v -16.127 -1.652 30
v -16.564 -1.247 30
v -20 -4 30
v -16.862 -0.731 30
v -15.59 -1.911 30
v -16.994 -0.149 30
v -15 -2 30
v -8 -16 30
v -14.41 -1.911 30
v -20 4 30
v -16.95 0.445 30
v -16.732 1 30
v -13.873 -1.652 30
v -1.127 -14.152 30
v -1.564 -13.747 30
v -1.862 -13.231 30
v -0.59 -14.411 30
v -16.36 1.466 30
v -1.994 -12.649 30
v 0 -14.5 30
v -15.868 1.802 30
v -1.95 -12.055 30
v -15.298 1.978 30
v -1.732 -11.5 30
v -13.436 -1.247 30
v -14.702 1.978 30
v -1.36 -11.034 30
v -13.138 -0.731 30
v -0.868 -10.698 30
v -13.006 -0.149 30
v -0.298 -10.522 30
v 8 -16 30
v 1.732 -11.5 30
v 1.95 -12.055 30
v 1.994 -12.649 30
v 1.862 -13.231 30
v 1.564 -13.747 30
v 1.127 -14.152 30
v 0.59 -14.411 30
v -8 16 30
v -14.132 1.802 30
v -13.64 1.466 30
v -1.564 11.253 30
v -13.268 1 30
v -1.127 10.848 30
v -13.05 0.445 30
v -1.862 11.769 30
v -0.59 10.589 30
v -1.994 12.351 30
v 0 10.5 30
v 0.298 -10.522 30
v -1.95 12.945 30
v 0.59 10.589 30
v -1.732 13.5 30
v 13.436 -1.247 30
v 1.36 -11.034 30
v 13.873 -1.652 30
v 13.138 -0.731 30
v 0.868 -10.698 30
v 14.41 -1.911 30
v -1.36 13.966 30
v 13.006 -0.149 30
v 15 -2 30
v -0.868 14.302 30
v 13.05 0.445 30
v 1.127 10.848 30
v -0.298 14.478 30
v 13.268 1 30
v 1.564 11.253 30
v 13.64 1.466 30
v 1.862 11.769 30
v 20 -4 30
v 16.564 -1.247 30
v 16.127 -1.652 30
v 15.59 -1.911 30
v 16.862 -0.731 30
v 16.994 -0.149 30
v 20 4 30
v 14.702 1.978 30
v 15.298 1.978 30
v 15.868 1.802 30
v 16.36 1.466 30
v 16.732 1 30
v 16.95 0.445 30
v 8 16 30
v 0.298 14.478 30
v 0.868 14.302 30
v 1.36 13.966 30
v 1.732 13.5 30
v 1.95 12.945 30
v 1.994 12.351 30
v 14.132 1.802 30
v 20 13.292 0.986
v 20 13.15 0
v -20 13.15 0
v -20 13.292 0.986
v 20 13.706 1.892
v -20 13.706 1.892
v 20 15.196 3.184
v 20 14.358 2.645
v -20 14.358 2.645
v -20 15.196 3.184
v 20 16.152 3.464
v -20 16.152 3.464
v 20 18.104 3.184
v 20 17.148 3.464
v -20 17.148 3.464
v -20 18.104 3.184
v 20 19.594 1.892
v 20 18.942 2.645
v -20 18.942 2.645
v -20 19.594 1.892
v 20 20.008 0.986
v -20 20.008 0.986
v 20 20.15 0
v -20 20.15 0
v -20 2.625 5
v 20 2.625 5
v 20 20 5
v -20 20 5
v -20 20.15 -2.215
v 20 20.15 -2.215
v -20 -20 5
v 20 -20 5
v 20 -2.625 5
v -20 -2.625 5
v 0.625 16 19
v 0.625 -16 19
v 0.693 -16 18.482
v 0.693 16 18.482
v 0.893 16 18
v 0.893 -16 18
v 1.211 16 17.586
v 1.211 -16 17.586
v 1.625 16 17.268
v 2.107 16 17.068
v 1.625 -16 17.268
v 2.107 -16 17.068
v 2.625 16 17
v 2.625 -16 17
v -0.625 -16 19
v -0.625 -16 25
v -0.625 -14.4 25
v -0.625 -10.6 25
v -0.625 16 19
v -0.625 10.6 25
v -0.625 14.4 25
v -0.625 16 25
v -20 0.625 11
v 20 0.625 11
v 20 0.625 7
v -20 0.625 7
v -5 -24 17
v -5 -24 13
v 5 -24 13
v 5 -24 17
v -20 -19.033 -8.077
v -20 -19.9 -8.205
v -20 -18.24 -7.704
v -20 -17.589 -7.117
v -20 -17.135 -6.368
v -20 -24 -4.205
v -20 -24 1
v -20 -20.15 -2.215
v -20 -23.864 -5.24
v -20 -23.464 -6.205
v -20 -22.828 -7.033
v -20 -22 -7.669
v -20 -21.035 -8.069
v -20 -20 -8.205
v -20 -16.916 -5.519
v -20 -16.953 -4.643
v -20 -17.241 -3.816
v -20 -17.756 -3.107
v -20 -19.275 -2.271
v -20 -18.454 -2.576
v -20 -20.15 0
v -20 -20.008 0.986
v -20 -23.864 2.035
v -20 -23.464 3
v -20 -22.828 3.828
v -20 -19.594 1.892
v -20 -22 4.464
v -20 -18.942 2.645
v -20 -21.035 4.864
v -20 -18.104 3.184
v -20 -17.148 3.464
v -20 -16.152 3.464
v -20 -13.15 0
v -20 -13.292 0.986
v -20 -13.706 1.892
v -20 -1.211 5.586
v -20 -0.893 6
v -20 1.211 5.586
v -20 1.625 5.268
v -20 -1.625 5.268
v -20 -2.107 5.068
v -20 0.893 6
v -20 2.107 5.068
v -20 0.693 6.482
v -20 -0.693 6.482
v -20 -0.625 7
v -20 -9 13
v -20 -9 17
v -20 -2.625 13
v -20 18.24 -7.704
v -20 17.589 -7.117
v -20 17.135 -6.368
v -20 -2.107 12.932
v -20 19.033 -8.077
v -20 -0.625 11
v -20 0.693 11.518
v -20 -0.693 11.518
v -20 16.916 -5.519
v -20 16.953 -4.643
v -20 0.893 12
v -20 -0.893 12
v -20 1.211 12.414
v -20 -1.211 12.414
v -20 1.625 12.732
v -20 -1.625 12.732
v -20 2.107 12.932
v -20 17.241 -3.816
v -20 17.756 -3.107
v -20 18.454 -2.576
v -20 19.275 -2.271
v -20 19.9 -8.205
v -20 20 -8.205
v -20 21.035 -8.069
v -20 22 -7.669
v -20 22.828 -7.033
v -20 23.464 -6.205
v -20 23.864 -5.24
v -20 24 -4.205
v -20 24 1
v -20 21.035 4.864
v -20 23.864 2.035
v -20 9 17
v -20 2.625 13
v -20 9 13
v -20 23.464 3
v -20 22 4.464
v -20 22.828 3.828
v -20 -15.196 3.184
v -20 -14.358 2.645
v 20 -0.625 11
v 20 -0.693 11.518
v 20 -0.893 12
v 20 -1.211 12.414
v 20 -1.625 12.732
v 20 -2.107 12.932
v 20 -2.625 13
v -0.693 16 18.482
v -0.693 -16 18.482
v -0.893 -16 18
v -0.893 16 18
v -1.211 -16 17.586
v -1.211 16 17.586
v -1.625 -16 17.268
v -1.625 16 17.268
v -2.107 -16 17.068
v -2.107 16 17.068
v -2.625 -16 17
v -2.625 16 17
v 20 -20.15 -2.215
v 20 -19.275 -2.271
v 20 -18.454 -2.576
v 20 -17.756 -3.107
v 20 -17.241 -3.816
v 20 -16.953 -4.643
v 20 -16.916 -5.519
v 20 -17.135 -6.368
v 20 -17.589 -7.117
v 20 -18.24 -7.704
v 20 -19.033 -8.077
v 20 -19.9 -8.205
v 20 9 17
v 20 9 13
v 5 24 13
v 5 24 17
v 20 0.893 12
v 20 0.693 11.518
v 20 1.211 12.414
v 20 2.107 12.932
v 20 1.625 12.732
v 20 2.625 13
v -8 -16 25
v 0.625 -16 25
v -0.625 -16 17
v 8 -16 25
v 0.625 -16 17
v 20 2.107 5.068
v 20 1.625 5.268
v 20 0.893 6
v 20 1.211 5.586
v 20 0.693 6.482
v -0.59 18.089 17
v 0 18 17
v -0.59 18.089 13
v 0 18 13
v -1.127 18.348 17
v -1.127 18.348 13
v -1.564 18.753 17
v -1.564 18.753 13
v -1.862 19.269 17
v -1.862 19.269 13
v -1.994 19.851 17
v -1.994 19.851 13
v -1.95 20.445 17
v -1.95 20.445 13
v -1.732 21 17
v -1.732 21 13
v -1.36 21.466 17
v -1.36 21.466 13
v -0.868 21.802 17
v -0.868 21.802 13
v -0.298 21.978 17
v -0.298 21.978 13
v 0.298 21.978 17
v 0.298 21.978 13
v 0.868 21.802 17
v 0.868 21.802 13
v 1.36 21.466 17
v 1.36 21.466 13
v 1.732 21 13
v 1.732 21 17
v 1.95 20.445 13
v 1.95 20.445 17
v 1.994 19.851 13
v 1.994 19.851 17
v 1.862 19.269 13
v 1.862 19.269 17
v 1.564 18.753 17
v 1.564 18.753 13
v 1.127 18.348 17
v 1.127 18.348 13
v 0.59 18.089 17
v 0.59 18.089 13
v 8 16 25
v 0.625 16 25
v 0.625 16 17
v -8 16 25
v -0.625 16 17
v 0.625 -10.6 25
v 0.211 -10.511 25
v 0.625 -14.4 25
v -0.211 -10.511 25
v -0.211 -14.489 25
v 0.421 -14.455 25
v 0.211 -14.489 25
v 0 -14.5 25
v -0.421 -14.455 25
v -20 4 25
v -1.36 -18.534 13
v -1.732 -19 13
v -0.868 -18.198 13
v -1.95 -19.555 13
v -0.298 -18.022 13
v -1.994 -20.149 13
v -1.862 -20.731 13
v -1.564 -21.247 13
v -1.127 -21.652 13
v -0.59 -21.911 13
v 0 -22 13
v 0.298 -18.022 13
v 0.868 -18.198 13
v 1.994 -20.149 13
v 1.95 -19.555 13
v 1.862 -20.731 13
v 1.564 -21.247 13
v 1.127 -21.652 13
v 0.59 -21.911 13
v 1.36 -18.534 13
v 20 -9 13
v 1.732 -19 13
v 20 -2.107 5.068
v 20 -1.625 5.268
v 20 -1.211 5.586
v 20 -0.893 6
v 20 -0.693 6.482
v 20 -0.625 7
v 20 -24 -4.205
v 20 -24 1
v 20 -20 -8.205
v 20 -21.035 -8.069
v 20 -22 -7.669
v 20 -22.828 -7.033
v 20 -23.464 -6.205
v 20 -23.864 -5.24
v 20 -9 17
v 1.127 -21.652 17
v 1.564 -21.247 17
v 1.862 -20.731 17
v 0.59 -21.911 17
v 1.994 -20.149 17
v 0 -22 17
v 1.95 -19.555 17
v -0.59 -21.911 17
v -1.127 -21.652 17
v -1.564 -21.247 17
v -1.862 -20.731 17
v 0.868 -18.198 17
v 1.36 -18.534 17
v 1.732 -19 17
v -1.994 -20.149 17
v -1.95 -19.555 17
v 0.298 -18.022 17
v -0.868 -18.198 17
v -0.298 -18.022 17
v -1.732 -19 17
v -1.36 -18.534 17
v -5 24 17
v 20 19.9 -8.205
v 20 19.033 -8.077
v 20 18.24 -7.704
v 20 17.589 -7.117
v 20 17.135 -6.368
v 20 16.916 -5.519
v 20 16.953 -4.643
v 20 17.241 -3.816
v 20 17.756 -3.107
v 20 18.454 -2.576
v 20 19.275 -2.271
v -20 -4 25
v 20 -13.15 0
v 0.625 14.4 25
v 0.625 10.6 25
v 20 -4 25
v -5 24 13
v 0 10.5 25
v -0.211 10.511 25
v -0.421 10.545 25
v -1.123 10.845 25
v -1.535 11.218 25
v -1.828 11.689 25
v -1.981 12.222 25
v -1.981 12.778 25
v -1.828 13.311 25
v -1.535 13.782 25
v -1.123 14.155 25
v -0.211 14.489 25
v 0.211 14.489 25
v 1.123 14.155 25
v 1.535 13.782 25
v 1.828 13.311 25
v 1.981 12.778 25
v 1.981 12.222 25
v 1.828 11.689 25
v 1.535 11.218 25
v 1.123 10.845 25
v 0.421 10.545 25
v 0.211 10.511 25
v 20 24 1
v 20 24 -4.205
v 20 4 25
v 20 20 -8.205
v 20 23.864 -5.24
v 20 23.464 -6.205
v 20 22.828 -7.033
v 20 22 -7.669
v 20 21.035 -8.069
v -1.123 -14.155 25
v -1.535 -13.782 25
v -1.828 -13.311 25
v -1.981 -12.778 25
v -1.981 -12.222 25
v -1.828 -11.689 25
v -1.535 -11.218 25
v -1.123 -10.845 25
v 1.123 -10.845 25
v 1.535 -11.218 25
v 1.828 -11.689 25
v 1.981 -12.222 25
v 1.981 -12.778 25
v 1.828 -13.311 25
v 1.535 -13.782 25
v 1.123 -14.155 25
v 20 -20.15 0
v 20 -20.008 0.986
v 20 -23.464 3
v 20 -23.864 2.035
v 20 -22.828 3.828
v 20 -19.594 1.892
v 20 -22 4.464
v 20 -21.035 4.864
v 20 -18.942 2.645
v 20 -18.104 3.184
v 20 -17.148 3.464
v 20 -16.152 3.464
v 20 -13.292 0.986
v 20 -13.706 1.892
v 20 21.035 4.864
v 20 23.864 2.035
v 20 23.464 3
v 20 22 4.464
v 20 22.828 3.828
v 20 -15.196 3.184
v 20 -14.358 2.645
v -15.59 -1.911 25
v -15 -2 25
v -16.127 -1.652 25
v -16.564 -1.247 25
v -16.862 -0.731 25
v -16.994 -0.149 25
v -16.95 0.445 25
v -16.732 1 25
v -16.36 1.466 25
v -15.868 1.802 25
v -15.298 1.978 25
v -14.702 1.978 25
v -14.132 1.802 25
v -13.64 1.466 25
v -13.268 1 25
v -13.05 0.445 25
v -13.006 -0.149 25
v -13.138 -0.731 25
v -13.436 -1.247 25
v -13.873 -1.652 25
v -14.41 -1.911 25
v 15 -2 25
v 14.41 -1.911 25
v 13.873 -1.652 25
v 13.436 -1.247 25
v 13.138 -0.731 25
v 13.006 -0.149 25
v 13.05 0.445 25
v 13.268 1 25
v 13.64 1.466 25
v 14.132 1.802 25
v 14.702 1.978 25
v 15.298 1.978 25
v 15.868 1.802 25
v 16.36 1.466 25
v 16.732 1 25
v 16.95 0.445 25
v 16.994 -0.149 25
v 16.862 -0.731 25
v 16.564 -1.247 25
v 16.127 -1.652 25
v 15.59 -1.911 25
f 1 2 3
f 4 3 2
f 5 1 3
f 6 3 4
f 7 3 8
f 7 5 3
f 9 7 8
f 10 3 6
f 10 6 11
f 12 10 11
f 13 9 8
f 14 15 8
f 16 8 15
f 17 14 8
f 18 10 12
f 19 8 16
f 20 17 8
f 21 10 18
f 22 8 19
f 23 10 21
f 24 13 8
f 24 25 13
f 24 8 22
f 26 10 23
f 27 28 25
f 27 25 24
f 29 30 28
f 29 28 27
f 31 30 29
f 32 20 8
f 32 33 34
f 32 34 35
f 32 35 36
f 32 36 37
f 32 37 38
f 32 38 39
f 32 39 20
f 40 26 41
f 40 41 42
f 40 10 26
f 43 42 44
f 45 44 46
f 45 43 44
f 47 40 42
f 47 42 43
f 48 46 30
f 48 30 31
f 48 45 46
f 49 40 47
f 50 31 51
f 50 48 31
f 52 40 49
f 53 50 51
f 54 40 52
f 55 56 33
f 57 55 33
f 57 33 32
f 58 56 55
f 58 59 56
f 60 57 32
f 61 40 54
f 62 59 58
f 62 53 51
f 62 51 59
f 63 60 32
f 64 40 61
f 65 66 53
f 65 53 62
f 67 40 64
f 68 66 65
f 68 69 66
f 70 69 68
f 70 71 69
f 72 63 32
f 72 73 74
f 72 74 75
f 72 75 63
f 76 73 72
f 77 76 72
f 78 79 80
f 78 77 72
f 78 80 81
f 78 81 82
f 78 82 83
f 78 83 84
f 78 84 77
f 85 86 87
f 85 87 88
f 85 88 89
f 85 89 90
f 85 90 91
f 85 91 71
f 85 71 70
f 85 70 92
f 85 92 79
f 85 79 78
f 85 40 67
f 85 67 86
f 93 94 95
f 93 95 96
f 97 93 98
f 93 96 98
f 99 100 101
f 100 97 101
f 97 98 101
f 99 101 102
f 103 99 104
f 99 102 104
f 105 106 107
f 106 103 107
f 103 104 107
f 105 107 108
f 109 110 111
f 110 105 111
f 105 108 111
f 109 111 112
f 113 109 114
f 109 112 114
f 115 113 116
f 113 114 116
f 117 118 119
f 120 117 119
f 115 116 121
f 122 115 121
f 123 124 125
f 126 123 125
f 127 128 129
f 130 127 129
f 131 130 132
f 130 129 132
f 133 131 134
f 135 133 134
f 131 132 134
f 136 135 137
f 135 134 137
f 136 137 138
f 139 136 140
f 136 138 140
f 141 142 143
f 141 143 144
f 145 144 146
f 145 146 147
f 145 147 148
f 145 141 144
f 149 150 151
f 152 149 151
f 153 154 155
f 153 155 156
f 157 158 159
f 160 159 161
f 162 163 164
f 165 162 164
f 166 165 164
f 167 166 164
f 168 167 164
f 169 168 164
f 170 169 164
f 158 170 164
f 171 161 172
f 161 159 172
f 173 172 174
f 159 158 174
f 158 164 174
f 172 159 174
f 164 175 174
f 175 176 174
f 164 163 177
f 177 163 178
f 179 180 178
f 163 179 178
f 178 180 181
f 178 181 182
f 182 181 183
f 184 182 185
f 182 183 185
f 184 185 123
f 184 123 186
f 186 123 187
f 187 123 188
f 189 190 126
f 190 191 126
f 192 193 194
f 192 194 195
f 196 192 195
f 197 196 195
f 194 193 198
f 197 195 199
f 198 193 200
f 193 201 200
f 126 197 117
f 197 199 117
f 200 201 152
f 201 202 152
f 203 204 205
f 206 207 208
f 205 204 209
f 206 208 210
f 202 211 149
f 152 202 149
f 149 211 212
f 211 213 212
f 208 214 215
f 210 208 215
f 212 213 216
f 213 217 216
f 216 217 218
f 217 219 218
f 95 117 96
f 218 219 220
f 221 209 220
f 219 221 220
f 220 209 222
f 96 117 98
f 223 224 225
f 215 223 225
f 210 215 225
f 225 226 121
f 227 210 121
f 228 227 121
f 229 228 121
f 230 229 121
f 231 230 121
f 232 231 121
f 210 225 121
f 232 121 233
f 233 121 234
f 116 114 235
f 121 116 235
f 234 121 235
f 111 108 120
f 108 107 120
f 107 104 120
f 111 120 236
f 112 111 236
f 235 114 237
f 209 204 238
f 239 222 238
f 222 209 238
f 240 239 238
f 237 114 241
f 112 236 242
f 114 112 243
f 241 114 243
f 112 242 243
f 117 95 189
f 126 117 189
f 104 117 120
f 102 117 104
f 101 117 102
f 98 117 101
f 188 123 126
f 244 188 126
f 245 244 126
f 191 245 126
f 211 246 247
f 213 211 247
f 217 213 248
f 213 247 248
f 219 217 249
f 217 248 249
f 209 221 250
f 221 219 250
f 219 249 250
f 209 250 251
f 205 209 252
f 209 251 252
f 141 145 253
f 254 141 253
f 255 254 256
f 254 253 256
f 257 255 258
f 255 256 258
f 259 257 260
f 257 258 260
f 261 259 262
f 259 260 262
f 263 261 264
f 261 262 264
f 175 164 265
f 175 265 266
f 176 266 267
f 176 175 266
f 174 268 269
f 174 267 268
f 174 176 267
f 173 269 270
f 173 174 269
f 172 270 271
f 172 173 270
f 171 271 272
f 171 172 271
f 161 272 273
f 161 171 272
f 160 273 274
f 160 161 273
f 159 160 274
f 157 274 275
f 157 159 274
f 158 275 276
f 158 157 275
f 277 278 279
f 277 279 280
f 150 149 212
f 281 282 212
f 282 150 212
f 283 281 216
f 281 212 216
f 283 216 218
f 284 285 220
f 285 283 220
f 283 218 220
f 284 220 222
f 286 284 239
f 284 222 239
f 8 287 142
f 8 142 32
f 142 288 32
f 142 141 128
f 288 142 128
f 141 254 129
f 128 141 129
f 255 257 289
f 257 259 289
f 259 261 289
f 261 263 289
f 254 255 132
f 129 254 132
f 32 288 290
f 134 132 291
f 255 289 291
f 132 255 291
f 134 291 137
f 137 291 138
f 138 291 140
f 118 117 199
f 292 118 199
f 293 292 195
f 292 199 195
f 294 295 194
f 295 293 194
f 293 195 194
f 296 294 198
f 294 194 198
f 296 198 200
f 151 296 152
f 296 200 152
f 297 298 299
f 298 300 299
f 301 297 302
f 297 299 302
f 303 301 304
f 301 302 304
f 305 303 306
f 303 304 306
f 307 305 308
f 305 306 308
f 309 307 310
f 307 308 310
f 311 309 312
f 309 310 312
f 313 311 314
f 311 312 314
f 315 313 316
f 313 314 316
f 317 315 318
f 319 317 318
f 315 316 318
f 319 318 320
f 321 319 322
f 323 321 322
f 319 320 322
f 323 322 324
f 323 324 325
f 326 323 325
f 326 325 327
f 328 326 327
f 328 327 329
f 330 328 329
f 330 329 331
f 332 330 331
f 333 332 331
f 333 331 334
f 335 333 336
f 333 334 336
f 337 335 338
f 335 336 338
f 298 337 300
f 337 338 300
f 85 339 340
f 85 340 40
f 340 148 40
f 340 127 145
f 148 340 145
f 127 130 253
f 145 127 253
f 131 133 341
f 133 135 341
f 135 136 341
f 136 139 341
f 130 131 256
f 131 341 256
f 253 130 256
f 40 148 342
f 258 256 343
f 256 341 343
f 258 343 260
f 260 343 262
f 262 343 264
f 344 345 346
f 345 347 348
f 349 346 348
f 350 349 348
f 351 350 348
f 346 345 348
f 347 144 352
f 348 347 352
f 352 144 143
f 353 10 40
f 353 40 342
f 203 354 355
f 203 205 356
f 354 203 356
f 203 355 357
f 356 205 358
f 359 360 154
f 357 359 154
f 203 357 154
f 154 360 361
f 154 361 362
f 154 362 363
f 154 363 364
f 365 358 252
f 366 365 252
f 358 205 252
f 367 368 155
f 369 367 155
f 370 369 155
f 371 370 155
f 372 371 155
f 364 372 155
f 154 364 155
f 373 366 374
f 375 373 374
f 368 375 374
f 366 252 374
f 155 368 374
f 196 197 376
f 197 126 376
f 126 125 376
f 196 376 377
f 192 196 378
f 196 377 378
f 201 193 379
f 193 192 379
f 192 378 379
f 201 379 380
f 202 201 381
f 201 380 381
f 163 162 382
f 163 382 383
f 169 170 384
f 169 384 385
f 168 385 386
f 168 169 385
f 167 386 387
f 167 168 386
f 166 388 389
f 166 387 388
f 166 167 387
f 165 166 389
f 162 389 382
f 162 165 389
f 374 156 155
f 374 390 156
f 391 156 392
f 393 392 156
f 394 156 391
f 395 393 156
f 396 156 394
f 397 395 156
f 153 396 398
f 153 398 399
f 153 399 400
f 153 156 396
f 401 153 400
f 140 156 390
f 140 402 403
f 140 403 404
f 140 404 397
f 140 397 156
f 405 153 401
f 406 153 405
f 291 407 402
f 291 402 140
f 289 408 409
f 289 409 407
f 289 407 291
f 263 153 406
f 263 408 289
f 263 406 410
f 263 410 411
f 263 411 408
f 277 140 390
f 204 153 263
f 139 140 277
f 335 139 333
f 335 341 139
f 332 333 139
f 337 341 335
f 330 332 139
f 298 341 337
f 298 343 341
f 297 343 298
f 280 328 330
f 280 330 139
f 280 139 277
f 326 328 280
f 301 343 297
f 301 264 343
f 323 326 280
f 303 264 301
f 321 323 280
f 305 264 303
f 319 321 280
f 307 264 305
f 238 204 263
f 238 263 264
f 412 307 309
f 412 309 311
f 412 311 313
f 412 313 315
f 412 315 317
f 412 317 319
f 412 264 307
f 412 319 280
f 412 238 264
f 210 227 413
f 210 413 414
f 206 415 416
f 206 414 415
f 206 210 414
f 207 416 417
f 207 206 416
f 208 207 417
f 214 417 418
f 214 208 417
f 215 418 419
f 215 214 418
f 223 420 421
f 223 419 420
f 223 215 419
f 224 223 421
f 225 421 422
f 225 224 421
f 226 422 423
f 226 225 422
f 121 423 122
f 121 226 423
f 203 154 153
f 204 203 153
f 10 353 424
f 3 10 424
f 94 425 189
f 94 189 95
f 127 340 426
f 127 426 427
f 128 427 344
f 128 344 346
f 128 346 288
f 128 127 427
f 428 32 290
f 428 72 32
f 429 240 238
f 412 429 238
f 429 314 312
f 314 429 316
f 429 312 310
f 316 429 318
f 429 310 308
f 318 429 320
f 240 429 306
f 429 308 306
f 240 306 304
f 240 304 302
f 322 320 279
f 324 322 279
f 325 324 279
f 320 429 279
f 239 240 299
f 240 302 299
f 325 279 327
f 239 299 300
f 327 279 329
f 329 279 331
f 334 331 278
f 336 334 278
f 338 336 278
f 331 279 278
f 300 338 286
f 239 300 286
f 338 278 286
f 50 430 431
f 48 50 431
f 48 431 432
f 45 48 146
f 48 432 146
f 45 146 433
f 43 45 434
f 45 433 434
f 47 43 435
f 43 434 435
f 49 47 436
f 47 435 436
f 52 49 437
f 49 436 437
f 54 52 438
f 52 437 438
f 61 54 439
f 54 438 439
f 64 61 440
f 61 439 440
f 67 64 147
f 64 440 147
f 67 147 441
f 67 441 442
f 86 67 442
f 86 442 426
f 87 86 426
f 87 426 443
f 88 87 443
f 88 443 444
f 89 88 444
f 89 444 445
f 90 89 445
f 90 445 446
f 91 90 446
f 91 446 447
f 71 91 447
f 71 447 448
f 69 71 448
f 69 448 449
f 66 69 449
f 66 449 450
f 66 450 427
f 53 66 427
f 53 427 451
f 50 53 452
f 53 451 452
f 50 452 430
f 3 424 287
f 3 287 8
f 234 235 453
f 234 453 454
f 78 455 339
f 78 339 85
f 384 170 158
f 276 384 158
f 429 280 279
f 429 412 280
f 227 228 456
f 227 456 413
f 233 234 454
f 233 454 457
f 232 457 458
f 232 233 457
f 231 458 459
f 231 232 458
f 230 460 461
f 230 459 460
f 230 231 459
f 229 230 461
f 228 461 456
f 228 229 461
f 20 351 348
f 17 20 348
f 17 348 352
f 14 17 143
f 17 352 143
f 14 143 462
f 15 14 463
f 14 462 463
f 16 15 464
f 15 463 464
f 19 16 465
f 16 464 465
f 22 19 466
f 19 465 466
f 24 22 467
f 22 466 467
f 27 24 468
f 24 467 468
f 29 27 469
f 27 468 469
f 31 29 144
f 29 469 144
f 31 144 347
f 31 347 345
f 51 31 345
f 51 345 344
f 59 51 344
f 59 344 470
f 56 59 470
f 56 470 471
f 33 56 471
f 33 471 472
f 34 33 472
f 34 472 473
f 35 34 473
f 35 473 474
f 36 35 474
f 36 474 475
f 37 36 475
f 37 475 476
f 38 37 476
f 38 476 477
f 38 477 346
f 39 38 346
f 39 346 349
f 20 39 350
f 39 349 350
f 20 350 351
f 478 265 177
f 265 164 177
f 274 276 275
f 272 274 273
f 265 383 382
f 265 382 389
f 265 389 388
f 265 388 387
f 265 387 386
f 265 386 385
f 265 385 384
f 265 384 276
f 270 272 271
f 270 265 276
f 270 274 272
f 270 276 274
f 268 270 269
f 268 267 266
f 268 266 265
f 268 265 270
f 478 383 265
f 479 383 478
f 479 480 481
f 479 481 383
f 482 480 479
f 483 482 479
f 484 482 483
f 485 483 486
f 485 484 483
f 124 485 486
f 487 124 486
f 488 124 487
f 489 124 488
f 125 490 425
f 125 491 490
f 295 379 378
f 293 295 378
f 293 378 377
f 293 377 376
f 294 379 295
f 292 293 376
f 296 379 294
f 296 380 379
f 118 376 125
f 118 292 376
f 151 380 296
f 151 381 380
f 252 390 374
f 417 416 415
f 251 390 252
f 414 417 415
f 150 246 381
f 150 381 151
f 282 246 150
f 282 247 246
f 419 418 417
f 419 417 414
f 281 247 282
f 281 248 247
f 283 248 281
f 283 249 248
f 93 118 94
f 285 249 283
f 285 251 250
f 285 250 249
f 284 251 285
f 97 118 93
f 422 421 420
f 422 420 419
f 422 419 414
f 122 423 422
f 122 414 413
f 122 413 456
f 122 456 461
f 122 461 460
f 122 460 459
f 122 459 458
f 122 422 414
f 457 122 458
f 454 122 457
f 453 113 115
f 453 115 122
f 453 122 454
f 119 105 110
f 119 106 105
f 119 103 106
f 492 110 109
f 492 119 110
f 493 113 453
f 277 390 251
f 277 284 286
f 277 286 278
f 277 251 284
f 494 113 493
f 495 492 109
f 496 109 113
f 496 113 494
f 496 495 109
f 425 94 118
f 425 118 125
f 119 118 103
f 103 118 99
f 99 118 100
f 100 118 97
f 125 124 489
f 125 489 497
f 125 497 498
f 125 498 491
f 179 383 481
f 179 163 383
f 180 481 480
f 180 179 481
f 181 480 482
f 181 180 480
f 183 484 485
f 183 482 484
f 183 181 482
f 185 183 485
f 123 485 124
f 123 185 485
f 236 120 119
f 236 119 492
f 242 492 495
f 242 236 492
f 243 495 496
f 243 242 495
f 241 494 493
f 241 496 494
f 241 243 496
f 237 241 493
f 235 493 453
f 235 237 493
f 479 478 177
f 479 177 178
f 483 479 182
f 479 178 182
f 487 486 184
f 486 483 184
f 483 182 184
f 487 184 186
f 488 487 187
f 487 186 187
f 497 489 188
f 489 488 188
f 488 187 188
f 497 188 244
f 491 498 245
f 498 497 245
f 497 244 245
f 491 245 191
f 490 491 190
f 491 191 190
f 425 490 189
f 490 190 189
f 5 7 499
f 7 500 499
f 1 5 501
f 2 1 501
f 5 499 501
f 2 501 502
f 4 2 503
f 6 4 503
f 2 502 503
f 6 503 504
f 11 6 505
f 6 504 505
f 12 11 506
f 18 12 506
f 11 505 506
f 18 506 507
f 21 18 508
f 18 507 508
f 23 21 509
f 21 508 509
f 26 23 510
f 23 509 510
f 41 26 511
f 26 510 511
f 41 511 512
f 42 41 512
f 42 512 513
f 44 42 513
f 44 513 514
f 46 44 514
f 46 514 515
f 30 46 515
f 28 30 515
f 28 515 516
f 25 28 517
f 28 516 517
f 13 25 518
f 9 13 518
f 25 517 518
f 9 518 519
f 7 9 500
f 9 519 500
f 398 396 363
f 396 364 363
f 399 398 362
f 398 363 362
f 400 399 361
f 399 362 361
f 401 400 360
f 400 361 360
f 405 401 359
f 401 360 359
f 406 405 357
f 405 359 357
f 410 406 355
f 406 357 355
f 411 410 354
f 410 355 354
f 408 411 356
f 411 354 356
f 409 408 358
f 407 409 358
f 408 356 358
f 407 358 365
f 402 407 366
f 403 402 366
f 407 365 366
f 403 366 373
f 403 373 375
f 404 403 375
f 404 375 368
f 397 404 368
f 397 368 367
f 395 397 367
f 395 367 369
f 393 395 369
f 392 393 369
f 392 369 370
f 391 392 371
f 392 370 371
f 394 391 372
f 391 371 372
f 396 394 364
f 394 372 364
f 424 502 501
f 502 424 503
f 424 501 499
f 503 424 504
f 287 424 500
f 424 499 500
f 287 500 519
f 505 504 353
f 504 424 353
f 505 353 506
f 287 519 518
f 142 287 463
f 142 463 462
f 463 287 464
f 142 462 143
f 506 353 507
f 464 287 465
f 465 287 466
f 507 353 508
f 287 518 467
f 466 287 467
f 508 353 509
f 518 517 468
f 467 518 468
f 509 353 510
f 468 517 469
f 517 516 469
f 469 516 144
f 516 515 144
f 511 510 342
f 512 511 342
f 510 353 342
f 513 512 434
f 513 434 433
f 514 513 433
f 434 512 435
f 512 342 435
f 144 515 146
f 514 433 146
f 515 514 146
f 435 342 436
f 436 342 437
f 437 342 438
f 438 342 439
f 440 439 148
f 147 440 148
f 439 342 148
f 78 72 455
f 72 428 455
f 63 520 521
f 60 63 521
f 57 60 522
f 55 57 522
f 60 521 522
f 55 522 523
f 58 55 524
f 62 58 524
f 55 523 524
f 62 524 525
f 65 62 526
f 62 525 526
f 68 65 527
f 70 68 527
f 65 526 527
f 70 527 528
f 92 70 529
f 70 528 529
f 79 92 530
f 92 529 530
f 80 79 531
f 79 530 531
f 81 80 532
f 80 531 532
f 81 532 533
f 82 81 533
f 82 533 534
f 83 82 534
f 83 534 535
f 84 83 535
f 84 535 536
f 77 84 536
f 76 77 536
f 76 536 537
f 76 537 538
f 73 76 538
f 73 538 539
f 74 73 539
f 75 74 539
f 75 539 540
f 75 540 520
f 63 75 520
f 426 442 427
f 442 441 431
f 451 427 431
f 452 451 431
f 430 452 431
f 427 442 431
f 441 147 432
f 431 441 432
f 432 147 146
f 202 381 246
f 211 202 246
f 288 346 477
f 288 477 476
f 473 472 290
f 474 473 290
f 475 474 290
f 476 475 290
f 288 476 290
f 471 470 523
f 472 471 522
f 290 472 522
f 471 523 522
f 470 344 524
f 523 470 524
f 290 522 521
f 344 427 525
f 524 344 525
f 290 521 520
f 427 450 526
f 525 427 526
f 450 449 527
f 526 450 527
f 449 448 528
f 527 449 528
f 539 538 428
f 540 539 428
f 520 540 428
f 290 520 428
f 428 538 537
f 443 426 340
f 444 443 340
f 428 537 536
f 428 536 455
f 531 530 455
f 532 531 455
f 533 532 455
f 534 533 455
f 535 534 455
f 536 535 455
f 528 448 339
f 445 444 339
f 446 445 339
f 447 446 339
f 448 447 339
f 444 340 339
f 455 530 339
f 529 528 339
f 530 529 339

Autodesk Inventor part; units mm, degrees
ref_plane "YZ Plane" through (0, 0, 0) normal (1, 0, 0) x (0, 1, 0)
ref_plane "XZ Plane" through (0, 0, 0) normal (0, 1, 0) x (-1, 0, 0)
ref_plane "XY Plane" through (0, 0, 0) normal (0, 0, 1) x (1, 0, 0)
sketch "Sketch1" plane through (0, 0, 0) normal (1, 0, 0) x (0, 1, 0)
  line L0 (-24, -4.205) -> (-24, 1)
  line L1 (-20, 5) -> (20, 5)
  line L2 (24, 1) -> (24, -4.205)
  line L3 (20, -8.205) -> (19.9, -8.205)
  line L4 (-20, -8.205) -> (-19.9, -8.205)
  line L5 (-20.15, -2.2154) -> (-20.15, 0)
  line L6 (-20.15, 0) -> (20.15, 0)
  line L7 (20.15, 0) -> (20.15, -2.2154)
  line L8 (-0.625, 5) -> (-0.625, 13)
  line L9 (-0.625, 13) -> (0.625, 13)
  line L10 (0.625, 13) -> (0.625, 5)
  line L11 (-24, 17) -> (24, 17)
  line L12 (24, 17) -> (24, 13)
  line L13 (24, 13) -> (-24, 13)
  line L14 (-24, 13) -> (-24, 17)
  arc A0 (24, 1) -> (20, 5) centre (20, 1) ccw
  arc A1 (-20, 5) -> (-24, 1) centre (-20, 1) ccw
  arc A2 (20.15, 0) -> (13.15, 0) centre (16.65, 0) ccw
  arc A3 (-13.15, 0) -> (-20.15, 0) centre (-16.65, 0) ccw
  arc A4 (20.15, -2.2154) -> (19.9, -8.205) centre (19.9, -5.205) ccw
  arc A5 (20, -8.205) -> (24, -4.205) centre (20, -4.205) ccw
  circle A6 centre (-19.9, -5.205) radius 3
  arc A7 (-24, -4.205) -> (-20, -8.205) centre (-20, -4.205) ccw
  point P0 (0, 0)
  point P1 (-24, -8.205)
  point P2 (-24, 5)
  point P3 (24, 5)
  point P4 (24, -8.205)
  point P5 (0, 5)
  point P6 (0, 0)
  point P7 (0, 13)
  point P8 (0.625, 13)
  point P9 (-0.625, 13)
  dimension "d65" = 6
  dimension "d2" = 40.3
  dimension "d10" = 48
  dimension "d11" = 5
  dimension "d13" = 1.25
  dimension "d14" = 8
  dimension "d15" = 4
  dimension "d52" = 4
  dimension "d53" = 7
  dimension "d54" = 7
  dimension "d61" = 6
  dimension "d62" = 5.205
  dimension "d63" = 0.25
  dimension "d64" = 4
  dimension "d66" = 0.25
  dimension "d67" = 4
extrude "Extrusion1" add sketch "Sketch1" along normal mid plane 40 contours L0 A1 L1 A0 L2 A5 L3 A4 L7 A2 L6 A3 L5 A6 A7 | A6 L4 | L8 L9 L10 L1 | L13 L14 L11 L12 L9
sketch "Sketch2" plane through (-20, -24, 17) normal (0, 0, 1) x (1, 0, 0)
  line L0 (0, 0) -> (40, 0) projected
  line L1 (40, 48) -> (40, 0) projected
  line L2 (0, 48) -> (40, 48) projected
  line L3 (0, 0) -> (0, 48) projected
  line L4 (20.625, 8) -> (19.375, 8)
  line L5 (19.375, 8) -> (19.375, 40)
  line L6 (19.375, 40) -> (20.625, 40)
  line L7 (20.625, 40) -> (20.625, 8)
  line L8 (20.625, 8) -> (19.375, 40) construction
  line L9 (19.375, 8) -> (20.625, 40) construction
  point P0 (20, 24)
  point P1 (20.75, 0)
  point P2 (20.75, 50)
  point P3 (19.25, 50)
  point P4 (19.25, 0)
  point P5 (20, 8)
  dimension "d16" = 1.25
  dimension "d19" = 8
extrude "Extrusion2" add sketch "Sketch2" along normal blind 8 contours L4 L5 L6 L7
sketch "Sketch3" plane through (-20, -24, 17) normal (0, 0, 1) x (1, 0, 0)
  line L0 (20.625, 40) -> (20.625, 8) projected
  line L1 (20.625, 8) -> (19.375, 8) projected
  line L2 (19.375, 8) -> (19.375, 40) projected
  line L3 (19.375, 40) -> (20.625, 40) projected
  line L4 (0, 0) -> (40, 0) projected
  line L5 (40, 48) -> (40, 0) projected
  line L6 (0, 48) -> (40, 48) projected
  line L7 (0, 0) -> (0, 48) projected
  line L8 (20.625, 8) -> (19.375, 8) projected
  line L9 (20, 8) -> (20, 0)
  line L10 (19.375, 40) -> (20.625, 40) projected
  line L11 (20, 40) -> (20, 48)
  point P0 (20, 24)
  point P1 (20, 4)
  point P2 (20, 44)
hole "Hole1" at (0, -20, 17) at (0, 20, 17) direction (0, 0, -1) diameter 4 depth 8 tip angle 118
sketch "Sketch4" plane through (-20, -24, 25) normal (0, 0, 1) x (1, 0, 0)
  line L0 (0, 8) -> (40, 8)
  line L1 (40, 8) -> (40, 40)
  line L2 (40, 40) -> (0, 40)
  line L3 (0, 40) -> (0, 8)
  line L4 (0, 8) -> (40, 40) construction
  line L5 (40, 8) -> (0, 40) construction
  line L6 (20.625, 40) -> (19.375, 40) projected
  line L7 (0, 0) -> (0, 48) projected
  point P0 (20, 24)
  point P1 (20, 40)
  point P2 (0, 24)
extrude "Extrusion3" add sketch "Sketch4" along normal blind 5
sketch "Sketch5" plane through (-20, -24, 30) normal (0, 0, 1) x (1, 0, 0)
  line L0 (40, 40) -> (0, 40) projected
  line L1 (0, 40) -> (0, 8) projected
  line L2 (0, 8) -> (40, 8) projected
  line L3 (40, 8) -> (40, 40) projected
  line L4 (5, 24) -> (35, 24)
  point P0 (20, 24)
  point P1 (20, 24)
  dimension "d29" = 5
hole "Hole2" at (-15, 0, 30) at (15, 0, 30) direction (0, 0, -1) diameter 4 depth 8 tip angle 118
sketch "Sketch6" plane through (-20, -24, 30) normal (0, 0, 1) x (1, 0, 0)
  circle A0 centre (5, 24) radius 2 projected
  circle A1 centre (35, 24) radius 2 projected
  line L0 (40, 40) -> (0, 40) projected
  line L1 (0, 40) -> (0, 8) projected
  line L2 (0, 8) -> (40, 8) projected
  line L3 (40, 8) -> (40, 40) projected
  line L4 (20, 11.5) -> (20, 36.5)
  point P0 (20, 24)
  point P1 (20, 24)
  point P2 (20, 24)
  dimension "d38" = 25
hole "Hole3" at (0, -12.5, 30) at (0, 12.5, 30) direction (0, 0, -1) diameter 4 depth 5
chamfer "Chamfer1" distance 15 angle 45 4 edges at (-20, -24, 15) (-20, 24, 15) (20, -24, 15) (20, 24, 15)
chamfer "Chamfer2" distance 12 angle 45 4 edges at (20, 16, 27.5) (20, -16, 27.5) (-20, -16, 27.5) (-20, 16, 27.5)
fillet "Fillet1" radius 2 6 edges at (0.625, 0, 17) (-0.625, 0, 17) (0, -0.625, 5) (0, 0.625, 5) (0, -0.625, 13) (0, 0.625, 13)
equation "\"d54\" = d53"
equation "\"d66\" = d63"
properties part number "MicroRail-FlextureBase" material "ABS Plastic"
